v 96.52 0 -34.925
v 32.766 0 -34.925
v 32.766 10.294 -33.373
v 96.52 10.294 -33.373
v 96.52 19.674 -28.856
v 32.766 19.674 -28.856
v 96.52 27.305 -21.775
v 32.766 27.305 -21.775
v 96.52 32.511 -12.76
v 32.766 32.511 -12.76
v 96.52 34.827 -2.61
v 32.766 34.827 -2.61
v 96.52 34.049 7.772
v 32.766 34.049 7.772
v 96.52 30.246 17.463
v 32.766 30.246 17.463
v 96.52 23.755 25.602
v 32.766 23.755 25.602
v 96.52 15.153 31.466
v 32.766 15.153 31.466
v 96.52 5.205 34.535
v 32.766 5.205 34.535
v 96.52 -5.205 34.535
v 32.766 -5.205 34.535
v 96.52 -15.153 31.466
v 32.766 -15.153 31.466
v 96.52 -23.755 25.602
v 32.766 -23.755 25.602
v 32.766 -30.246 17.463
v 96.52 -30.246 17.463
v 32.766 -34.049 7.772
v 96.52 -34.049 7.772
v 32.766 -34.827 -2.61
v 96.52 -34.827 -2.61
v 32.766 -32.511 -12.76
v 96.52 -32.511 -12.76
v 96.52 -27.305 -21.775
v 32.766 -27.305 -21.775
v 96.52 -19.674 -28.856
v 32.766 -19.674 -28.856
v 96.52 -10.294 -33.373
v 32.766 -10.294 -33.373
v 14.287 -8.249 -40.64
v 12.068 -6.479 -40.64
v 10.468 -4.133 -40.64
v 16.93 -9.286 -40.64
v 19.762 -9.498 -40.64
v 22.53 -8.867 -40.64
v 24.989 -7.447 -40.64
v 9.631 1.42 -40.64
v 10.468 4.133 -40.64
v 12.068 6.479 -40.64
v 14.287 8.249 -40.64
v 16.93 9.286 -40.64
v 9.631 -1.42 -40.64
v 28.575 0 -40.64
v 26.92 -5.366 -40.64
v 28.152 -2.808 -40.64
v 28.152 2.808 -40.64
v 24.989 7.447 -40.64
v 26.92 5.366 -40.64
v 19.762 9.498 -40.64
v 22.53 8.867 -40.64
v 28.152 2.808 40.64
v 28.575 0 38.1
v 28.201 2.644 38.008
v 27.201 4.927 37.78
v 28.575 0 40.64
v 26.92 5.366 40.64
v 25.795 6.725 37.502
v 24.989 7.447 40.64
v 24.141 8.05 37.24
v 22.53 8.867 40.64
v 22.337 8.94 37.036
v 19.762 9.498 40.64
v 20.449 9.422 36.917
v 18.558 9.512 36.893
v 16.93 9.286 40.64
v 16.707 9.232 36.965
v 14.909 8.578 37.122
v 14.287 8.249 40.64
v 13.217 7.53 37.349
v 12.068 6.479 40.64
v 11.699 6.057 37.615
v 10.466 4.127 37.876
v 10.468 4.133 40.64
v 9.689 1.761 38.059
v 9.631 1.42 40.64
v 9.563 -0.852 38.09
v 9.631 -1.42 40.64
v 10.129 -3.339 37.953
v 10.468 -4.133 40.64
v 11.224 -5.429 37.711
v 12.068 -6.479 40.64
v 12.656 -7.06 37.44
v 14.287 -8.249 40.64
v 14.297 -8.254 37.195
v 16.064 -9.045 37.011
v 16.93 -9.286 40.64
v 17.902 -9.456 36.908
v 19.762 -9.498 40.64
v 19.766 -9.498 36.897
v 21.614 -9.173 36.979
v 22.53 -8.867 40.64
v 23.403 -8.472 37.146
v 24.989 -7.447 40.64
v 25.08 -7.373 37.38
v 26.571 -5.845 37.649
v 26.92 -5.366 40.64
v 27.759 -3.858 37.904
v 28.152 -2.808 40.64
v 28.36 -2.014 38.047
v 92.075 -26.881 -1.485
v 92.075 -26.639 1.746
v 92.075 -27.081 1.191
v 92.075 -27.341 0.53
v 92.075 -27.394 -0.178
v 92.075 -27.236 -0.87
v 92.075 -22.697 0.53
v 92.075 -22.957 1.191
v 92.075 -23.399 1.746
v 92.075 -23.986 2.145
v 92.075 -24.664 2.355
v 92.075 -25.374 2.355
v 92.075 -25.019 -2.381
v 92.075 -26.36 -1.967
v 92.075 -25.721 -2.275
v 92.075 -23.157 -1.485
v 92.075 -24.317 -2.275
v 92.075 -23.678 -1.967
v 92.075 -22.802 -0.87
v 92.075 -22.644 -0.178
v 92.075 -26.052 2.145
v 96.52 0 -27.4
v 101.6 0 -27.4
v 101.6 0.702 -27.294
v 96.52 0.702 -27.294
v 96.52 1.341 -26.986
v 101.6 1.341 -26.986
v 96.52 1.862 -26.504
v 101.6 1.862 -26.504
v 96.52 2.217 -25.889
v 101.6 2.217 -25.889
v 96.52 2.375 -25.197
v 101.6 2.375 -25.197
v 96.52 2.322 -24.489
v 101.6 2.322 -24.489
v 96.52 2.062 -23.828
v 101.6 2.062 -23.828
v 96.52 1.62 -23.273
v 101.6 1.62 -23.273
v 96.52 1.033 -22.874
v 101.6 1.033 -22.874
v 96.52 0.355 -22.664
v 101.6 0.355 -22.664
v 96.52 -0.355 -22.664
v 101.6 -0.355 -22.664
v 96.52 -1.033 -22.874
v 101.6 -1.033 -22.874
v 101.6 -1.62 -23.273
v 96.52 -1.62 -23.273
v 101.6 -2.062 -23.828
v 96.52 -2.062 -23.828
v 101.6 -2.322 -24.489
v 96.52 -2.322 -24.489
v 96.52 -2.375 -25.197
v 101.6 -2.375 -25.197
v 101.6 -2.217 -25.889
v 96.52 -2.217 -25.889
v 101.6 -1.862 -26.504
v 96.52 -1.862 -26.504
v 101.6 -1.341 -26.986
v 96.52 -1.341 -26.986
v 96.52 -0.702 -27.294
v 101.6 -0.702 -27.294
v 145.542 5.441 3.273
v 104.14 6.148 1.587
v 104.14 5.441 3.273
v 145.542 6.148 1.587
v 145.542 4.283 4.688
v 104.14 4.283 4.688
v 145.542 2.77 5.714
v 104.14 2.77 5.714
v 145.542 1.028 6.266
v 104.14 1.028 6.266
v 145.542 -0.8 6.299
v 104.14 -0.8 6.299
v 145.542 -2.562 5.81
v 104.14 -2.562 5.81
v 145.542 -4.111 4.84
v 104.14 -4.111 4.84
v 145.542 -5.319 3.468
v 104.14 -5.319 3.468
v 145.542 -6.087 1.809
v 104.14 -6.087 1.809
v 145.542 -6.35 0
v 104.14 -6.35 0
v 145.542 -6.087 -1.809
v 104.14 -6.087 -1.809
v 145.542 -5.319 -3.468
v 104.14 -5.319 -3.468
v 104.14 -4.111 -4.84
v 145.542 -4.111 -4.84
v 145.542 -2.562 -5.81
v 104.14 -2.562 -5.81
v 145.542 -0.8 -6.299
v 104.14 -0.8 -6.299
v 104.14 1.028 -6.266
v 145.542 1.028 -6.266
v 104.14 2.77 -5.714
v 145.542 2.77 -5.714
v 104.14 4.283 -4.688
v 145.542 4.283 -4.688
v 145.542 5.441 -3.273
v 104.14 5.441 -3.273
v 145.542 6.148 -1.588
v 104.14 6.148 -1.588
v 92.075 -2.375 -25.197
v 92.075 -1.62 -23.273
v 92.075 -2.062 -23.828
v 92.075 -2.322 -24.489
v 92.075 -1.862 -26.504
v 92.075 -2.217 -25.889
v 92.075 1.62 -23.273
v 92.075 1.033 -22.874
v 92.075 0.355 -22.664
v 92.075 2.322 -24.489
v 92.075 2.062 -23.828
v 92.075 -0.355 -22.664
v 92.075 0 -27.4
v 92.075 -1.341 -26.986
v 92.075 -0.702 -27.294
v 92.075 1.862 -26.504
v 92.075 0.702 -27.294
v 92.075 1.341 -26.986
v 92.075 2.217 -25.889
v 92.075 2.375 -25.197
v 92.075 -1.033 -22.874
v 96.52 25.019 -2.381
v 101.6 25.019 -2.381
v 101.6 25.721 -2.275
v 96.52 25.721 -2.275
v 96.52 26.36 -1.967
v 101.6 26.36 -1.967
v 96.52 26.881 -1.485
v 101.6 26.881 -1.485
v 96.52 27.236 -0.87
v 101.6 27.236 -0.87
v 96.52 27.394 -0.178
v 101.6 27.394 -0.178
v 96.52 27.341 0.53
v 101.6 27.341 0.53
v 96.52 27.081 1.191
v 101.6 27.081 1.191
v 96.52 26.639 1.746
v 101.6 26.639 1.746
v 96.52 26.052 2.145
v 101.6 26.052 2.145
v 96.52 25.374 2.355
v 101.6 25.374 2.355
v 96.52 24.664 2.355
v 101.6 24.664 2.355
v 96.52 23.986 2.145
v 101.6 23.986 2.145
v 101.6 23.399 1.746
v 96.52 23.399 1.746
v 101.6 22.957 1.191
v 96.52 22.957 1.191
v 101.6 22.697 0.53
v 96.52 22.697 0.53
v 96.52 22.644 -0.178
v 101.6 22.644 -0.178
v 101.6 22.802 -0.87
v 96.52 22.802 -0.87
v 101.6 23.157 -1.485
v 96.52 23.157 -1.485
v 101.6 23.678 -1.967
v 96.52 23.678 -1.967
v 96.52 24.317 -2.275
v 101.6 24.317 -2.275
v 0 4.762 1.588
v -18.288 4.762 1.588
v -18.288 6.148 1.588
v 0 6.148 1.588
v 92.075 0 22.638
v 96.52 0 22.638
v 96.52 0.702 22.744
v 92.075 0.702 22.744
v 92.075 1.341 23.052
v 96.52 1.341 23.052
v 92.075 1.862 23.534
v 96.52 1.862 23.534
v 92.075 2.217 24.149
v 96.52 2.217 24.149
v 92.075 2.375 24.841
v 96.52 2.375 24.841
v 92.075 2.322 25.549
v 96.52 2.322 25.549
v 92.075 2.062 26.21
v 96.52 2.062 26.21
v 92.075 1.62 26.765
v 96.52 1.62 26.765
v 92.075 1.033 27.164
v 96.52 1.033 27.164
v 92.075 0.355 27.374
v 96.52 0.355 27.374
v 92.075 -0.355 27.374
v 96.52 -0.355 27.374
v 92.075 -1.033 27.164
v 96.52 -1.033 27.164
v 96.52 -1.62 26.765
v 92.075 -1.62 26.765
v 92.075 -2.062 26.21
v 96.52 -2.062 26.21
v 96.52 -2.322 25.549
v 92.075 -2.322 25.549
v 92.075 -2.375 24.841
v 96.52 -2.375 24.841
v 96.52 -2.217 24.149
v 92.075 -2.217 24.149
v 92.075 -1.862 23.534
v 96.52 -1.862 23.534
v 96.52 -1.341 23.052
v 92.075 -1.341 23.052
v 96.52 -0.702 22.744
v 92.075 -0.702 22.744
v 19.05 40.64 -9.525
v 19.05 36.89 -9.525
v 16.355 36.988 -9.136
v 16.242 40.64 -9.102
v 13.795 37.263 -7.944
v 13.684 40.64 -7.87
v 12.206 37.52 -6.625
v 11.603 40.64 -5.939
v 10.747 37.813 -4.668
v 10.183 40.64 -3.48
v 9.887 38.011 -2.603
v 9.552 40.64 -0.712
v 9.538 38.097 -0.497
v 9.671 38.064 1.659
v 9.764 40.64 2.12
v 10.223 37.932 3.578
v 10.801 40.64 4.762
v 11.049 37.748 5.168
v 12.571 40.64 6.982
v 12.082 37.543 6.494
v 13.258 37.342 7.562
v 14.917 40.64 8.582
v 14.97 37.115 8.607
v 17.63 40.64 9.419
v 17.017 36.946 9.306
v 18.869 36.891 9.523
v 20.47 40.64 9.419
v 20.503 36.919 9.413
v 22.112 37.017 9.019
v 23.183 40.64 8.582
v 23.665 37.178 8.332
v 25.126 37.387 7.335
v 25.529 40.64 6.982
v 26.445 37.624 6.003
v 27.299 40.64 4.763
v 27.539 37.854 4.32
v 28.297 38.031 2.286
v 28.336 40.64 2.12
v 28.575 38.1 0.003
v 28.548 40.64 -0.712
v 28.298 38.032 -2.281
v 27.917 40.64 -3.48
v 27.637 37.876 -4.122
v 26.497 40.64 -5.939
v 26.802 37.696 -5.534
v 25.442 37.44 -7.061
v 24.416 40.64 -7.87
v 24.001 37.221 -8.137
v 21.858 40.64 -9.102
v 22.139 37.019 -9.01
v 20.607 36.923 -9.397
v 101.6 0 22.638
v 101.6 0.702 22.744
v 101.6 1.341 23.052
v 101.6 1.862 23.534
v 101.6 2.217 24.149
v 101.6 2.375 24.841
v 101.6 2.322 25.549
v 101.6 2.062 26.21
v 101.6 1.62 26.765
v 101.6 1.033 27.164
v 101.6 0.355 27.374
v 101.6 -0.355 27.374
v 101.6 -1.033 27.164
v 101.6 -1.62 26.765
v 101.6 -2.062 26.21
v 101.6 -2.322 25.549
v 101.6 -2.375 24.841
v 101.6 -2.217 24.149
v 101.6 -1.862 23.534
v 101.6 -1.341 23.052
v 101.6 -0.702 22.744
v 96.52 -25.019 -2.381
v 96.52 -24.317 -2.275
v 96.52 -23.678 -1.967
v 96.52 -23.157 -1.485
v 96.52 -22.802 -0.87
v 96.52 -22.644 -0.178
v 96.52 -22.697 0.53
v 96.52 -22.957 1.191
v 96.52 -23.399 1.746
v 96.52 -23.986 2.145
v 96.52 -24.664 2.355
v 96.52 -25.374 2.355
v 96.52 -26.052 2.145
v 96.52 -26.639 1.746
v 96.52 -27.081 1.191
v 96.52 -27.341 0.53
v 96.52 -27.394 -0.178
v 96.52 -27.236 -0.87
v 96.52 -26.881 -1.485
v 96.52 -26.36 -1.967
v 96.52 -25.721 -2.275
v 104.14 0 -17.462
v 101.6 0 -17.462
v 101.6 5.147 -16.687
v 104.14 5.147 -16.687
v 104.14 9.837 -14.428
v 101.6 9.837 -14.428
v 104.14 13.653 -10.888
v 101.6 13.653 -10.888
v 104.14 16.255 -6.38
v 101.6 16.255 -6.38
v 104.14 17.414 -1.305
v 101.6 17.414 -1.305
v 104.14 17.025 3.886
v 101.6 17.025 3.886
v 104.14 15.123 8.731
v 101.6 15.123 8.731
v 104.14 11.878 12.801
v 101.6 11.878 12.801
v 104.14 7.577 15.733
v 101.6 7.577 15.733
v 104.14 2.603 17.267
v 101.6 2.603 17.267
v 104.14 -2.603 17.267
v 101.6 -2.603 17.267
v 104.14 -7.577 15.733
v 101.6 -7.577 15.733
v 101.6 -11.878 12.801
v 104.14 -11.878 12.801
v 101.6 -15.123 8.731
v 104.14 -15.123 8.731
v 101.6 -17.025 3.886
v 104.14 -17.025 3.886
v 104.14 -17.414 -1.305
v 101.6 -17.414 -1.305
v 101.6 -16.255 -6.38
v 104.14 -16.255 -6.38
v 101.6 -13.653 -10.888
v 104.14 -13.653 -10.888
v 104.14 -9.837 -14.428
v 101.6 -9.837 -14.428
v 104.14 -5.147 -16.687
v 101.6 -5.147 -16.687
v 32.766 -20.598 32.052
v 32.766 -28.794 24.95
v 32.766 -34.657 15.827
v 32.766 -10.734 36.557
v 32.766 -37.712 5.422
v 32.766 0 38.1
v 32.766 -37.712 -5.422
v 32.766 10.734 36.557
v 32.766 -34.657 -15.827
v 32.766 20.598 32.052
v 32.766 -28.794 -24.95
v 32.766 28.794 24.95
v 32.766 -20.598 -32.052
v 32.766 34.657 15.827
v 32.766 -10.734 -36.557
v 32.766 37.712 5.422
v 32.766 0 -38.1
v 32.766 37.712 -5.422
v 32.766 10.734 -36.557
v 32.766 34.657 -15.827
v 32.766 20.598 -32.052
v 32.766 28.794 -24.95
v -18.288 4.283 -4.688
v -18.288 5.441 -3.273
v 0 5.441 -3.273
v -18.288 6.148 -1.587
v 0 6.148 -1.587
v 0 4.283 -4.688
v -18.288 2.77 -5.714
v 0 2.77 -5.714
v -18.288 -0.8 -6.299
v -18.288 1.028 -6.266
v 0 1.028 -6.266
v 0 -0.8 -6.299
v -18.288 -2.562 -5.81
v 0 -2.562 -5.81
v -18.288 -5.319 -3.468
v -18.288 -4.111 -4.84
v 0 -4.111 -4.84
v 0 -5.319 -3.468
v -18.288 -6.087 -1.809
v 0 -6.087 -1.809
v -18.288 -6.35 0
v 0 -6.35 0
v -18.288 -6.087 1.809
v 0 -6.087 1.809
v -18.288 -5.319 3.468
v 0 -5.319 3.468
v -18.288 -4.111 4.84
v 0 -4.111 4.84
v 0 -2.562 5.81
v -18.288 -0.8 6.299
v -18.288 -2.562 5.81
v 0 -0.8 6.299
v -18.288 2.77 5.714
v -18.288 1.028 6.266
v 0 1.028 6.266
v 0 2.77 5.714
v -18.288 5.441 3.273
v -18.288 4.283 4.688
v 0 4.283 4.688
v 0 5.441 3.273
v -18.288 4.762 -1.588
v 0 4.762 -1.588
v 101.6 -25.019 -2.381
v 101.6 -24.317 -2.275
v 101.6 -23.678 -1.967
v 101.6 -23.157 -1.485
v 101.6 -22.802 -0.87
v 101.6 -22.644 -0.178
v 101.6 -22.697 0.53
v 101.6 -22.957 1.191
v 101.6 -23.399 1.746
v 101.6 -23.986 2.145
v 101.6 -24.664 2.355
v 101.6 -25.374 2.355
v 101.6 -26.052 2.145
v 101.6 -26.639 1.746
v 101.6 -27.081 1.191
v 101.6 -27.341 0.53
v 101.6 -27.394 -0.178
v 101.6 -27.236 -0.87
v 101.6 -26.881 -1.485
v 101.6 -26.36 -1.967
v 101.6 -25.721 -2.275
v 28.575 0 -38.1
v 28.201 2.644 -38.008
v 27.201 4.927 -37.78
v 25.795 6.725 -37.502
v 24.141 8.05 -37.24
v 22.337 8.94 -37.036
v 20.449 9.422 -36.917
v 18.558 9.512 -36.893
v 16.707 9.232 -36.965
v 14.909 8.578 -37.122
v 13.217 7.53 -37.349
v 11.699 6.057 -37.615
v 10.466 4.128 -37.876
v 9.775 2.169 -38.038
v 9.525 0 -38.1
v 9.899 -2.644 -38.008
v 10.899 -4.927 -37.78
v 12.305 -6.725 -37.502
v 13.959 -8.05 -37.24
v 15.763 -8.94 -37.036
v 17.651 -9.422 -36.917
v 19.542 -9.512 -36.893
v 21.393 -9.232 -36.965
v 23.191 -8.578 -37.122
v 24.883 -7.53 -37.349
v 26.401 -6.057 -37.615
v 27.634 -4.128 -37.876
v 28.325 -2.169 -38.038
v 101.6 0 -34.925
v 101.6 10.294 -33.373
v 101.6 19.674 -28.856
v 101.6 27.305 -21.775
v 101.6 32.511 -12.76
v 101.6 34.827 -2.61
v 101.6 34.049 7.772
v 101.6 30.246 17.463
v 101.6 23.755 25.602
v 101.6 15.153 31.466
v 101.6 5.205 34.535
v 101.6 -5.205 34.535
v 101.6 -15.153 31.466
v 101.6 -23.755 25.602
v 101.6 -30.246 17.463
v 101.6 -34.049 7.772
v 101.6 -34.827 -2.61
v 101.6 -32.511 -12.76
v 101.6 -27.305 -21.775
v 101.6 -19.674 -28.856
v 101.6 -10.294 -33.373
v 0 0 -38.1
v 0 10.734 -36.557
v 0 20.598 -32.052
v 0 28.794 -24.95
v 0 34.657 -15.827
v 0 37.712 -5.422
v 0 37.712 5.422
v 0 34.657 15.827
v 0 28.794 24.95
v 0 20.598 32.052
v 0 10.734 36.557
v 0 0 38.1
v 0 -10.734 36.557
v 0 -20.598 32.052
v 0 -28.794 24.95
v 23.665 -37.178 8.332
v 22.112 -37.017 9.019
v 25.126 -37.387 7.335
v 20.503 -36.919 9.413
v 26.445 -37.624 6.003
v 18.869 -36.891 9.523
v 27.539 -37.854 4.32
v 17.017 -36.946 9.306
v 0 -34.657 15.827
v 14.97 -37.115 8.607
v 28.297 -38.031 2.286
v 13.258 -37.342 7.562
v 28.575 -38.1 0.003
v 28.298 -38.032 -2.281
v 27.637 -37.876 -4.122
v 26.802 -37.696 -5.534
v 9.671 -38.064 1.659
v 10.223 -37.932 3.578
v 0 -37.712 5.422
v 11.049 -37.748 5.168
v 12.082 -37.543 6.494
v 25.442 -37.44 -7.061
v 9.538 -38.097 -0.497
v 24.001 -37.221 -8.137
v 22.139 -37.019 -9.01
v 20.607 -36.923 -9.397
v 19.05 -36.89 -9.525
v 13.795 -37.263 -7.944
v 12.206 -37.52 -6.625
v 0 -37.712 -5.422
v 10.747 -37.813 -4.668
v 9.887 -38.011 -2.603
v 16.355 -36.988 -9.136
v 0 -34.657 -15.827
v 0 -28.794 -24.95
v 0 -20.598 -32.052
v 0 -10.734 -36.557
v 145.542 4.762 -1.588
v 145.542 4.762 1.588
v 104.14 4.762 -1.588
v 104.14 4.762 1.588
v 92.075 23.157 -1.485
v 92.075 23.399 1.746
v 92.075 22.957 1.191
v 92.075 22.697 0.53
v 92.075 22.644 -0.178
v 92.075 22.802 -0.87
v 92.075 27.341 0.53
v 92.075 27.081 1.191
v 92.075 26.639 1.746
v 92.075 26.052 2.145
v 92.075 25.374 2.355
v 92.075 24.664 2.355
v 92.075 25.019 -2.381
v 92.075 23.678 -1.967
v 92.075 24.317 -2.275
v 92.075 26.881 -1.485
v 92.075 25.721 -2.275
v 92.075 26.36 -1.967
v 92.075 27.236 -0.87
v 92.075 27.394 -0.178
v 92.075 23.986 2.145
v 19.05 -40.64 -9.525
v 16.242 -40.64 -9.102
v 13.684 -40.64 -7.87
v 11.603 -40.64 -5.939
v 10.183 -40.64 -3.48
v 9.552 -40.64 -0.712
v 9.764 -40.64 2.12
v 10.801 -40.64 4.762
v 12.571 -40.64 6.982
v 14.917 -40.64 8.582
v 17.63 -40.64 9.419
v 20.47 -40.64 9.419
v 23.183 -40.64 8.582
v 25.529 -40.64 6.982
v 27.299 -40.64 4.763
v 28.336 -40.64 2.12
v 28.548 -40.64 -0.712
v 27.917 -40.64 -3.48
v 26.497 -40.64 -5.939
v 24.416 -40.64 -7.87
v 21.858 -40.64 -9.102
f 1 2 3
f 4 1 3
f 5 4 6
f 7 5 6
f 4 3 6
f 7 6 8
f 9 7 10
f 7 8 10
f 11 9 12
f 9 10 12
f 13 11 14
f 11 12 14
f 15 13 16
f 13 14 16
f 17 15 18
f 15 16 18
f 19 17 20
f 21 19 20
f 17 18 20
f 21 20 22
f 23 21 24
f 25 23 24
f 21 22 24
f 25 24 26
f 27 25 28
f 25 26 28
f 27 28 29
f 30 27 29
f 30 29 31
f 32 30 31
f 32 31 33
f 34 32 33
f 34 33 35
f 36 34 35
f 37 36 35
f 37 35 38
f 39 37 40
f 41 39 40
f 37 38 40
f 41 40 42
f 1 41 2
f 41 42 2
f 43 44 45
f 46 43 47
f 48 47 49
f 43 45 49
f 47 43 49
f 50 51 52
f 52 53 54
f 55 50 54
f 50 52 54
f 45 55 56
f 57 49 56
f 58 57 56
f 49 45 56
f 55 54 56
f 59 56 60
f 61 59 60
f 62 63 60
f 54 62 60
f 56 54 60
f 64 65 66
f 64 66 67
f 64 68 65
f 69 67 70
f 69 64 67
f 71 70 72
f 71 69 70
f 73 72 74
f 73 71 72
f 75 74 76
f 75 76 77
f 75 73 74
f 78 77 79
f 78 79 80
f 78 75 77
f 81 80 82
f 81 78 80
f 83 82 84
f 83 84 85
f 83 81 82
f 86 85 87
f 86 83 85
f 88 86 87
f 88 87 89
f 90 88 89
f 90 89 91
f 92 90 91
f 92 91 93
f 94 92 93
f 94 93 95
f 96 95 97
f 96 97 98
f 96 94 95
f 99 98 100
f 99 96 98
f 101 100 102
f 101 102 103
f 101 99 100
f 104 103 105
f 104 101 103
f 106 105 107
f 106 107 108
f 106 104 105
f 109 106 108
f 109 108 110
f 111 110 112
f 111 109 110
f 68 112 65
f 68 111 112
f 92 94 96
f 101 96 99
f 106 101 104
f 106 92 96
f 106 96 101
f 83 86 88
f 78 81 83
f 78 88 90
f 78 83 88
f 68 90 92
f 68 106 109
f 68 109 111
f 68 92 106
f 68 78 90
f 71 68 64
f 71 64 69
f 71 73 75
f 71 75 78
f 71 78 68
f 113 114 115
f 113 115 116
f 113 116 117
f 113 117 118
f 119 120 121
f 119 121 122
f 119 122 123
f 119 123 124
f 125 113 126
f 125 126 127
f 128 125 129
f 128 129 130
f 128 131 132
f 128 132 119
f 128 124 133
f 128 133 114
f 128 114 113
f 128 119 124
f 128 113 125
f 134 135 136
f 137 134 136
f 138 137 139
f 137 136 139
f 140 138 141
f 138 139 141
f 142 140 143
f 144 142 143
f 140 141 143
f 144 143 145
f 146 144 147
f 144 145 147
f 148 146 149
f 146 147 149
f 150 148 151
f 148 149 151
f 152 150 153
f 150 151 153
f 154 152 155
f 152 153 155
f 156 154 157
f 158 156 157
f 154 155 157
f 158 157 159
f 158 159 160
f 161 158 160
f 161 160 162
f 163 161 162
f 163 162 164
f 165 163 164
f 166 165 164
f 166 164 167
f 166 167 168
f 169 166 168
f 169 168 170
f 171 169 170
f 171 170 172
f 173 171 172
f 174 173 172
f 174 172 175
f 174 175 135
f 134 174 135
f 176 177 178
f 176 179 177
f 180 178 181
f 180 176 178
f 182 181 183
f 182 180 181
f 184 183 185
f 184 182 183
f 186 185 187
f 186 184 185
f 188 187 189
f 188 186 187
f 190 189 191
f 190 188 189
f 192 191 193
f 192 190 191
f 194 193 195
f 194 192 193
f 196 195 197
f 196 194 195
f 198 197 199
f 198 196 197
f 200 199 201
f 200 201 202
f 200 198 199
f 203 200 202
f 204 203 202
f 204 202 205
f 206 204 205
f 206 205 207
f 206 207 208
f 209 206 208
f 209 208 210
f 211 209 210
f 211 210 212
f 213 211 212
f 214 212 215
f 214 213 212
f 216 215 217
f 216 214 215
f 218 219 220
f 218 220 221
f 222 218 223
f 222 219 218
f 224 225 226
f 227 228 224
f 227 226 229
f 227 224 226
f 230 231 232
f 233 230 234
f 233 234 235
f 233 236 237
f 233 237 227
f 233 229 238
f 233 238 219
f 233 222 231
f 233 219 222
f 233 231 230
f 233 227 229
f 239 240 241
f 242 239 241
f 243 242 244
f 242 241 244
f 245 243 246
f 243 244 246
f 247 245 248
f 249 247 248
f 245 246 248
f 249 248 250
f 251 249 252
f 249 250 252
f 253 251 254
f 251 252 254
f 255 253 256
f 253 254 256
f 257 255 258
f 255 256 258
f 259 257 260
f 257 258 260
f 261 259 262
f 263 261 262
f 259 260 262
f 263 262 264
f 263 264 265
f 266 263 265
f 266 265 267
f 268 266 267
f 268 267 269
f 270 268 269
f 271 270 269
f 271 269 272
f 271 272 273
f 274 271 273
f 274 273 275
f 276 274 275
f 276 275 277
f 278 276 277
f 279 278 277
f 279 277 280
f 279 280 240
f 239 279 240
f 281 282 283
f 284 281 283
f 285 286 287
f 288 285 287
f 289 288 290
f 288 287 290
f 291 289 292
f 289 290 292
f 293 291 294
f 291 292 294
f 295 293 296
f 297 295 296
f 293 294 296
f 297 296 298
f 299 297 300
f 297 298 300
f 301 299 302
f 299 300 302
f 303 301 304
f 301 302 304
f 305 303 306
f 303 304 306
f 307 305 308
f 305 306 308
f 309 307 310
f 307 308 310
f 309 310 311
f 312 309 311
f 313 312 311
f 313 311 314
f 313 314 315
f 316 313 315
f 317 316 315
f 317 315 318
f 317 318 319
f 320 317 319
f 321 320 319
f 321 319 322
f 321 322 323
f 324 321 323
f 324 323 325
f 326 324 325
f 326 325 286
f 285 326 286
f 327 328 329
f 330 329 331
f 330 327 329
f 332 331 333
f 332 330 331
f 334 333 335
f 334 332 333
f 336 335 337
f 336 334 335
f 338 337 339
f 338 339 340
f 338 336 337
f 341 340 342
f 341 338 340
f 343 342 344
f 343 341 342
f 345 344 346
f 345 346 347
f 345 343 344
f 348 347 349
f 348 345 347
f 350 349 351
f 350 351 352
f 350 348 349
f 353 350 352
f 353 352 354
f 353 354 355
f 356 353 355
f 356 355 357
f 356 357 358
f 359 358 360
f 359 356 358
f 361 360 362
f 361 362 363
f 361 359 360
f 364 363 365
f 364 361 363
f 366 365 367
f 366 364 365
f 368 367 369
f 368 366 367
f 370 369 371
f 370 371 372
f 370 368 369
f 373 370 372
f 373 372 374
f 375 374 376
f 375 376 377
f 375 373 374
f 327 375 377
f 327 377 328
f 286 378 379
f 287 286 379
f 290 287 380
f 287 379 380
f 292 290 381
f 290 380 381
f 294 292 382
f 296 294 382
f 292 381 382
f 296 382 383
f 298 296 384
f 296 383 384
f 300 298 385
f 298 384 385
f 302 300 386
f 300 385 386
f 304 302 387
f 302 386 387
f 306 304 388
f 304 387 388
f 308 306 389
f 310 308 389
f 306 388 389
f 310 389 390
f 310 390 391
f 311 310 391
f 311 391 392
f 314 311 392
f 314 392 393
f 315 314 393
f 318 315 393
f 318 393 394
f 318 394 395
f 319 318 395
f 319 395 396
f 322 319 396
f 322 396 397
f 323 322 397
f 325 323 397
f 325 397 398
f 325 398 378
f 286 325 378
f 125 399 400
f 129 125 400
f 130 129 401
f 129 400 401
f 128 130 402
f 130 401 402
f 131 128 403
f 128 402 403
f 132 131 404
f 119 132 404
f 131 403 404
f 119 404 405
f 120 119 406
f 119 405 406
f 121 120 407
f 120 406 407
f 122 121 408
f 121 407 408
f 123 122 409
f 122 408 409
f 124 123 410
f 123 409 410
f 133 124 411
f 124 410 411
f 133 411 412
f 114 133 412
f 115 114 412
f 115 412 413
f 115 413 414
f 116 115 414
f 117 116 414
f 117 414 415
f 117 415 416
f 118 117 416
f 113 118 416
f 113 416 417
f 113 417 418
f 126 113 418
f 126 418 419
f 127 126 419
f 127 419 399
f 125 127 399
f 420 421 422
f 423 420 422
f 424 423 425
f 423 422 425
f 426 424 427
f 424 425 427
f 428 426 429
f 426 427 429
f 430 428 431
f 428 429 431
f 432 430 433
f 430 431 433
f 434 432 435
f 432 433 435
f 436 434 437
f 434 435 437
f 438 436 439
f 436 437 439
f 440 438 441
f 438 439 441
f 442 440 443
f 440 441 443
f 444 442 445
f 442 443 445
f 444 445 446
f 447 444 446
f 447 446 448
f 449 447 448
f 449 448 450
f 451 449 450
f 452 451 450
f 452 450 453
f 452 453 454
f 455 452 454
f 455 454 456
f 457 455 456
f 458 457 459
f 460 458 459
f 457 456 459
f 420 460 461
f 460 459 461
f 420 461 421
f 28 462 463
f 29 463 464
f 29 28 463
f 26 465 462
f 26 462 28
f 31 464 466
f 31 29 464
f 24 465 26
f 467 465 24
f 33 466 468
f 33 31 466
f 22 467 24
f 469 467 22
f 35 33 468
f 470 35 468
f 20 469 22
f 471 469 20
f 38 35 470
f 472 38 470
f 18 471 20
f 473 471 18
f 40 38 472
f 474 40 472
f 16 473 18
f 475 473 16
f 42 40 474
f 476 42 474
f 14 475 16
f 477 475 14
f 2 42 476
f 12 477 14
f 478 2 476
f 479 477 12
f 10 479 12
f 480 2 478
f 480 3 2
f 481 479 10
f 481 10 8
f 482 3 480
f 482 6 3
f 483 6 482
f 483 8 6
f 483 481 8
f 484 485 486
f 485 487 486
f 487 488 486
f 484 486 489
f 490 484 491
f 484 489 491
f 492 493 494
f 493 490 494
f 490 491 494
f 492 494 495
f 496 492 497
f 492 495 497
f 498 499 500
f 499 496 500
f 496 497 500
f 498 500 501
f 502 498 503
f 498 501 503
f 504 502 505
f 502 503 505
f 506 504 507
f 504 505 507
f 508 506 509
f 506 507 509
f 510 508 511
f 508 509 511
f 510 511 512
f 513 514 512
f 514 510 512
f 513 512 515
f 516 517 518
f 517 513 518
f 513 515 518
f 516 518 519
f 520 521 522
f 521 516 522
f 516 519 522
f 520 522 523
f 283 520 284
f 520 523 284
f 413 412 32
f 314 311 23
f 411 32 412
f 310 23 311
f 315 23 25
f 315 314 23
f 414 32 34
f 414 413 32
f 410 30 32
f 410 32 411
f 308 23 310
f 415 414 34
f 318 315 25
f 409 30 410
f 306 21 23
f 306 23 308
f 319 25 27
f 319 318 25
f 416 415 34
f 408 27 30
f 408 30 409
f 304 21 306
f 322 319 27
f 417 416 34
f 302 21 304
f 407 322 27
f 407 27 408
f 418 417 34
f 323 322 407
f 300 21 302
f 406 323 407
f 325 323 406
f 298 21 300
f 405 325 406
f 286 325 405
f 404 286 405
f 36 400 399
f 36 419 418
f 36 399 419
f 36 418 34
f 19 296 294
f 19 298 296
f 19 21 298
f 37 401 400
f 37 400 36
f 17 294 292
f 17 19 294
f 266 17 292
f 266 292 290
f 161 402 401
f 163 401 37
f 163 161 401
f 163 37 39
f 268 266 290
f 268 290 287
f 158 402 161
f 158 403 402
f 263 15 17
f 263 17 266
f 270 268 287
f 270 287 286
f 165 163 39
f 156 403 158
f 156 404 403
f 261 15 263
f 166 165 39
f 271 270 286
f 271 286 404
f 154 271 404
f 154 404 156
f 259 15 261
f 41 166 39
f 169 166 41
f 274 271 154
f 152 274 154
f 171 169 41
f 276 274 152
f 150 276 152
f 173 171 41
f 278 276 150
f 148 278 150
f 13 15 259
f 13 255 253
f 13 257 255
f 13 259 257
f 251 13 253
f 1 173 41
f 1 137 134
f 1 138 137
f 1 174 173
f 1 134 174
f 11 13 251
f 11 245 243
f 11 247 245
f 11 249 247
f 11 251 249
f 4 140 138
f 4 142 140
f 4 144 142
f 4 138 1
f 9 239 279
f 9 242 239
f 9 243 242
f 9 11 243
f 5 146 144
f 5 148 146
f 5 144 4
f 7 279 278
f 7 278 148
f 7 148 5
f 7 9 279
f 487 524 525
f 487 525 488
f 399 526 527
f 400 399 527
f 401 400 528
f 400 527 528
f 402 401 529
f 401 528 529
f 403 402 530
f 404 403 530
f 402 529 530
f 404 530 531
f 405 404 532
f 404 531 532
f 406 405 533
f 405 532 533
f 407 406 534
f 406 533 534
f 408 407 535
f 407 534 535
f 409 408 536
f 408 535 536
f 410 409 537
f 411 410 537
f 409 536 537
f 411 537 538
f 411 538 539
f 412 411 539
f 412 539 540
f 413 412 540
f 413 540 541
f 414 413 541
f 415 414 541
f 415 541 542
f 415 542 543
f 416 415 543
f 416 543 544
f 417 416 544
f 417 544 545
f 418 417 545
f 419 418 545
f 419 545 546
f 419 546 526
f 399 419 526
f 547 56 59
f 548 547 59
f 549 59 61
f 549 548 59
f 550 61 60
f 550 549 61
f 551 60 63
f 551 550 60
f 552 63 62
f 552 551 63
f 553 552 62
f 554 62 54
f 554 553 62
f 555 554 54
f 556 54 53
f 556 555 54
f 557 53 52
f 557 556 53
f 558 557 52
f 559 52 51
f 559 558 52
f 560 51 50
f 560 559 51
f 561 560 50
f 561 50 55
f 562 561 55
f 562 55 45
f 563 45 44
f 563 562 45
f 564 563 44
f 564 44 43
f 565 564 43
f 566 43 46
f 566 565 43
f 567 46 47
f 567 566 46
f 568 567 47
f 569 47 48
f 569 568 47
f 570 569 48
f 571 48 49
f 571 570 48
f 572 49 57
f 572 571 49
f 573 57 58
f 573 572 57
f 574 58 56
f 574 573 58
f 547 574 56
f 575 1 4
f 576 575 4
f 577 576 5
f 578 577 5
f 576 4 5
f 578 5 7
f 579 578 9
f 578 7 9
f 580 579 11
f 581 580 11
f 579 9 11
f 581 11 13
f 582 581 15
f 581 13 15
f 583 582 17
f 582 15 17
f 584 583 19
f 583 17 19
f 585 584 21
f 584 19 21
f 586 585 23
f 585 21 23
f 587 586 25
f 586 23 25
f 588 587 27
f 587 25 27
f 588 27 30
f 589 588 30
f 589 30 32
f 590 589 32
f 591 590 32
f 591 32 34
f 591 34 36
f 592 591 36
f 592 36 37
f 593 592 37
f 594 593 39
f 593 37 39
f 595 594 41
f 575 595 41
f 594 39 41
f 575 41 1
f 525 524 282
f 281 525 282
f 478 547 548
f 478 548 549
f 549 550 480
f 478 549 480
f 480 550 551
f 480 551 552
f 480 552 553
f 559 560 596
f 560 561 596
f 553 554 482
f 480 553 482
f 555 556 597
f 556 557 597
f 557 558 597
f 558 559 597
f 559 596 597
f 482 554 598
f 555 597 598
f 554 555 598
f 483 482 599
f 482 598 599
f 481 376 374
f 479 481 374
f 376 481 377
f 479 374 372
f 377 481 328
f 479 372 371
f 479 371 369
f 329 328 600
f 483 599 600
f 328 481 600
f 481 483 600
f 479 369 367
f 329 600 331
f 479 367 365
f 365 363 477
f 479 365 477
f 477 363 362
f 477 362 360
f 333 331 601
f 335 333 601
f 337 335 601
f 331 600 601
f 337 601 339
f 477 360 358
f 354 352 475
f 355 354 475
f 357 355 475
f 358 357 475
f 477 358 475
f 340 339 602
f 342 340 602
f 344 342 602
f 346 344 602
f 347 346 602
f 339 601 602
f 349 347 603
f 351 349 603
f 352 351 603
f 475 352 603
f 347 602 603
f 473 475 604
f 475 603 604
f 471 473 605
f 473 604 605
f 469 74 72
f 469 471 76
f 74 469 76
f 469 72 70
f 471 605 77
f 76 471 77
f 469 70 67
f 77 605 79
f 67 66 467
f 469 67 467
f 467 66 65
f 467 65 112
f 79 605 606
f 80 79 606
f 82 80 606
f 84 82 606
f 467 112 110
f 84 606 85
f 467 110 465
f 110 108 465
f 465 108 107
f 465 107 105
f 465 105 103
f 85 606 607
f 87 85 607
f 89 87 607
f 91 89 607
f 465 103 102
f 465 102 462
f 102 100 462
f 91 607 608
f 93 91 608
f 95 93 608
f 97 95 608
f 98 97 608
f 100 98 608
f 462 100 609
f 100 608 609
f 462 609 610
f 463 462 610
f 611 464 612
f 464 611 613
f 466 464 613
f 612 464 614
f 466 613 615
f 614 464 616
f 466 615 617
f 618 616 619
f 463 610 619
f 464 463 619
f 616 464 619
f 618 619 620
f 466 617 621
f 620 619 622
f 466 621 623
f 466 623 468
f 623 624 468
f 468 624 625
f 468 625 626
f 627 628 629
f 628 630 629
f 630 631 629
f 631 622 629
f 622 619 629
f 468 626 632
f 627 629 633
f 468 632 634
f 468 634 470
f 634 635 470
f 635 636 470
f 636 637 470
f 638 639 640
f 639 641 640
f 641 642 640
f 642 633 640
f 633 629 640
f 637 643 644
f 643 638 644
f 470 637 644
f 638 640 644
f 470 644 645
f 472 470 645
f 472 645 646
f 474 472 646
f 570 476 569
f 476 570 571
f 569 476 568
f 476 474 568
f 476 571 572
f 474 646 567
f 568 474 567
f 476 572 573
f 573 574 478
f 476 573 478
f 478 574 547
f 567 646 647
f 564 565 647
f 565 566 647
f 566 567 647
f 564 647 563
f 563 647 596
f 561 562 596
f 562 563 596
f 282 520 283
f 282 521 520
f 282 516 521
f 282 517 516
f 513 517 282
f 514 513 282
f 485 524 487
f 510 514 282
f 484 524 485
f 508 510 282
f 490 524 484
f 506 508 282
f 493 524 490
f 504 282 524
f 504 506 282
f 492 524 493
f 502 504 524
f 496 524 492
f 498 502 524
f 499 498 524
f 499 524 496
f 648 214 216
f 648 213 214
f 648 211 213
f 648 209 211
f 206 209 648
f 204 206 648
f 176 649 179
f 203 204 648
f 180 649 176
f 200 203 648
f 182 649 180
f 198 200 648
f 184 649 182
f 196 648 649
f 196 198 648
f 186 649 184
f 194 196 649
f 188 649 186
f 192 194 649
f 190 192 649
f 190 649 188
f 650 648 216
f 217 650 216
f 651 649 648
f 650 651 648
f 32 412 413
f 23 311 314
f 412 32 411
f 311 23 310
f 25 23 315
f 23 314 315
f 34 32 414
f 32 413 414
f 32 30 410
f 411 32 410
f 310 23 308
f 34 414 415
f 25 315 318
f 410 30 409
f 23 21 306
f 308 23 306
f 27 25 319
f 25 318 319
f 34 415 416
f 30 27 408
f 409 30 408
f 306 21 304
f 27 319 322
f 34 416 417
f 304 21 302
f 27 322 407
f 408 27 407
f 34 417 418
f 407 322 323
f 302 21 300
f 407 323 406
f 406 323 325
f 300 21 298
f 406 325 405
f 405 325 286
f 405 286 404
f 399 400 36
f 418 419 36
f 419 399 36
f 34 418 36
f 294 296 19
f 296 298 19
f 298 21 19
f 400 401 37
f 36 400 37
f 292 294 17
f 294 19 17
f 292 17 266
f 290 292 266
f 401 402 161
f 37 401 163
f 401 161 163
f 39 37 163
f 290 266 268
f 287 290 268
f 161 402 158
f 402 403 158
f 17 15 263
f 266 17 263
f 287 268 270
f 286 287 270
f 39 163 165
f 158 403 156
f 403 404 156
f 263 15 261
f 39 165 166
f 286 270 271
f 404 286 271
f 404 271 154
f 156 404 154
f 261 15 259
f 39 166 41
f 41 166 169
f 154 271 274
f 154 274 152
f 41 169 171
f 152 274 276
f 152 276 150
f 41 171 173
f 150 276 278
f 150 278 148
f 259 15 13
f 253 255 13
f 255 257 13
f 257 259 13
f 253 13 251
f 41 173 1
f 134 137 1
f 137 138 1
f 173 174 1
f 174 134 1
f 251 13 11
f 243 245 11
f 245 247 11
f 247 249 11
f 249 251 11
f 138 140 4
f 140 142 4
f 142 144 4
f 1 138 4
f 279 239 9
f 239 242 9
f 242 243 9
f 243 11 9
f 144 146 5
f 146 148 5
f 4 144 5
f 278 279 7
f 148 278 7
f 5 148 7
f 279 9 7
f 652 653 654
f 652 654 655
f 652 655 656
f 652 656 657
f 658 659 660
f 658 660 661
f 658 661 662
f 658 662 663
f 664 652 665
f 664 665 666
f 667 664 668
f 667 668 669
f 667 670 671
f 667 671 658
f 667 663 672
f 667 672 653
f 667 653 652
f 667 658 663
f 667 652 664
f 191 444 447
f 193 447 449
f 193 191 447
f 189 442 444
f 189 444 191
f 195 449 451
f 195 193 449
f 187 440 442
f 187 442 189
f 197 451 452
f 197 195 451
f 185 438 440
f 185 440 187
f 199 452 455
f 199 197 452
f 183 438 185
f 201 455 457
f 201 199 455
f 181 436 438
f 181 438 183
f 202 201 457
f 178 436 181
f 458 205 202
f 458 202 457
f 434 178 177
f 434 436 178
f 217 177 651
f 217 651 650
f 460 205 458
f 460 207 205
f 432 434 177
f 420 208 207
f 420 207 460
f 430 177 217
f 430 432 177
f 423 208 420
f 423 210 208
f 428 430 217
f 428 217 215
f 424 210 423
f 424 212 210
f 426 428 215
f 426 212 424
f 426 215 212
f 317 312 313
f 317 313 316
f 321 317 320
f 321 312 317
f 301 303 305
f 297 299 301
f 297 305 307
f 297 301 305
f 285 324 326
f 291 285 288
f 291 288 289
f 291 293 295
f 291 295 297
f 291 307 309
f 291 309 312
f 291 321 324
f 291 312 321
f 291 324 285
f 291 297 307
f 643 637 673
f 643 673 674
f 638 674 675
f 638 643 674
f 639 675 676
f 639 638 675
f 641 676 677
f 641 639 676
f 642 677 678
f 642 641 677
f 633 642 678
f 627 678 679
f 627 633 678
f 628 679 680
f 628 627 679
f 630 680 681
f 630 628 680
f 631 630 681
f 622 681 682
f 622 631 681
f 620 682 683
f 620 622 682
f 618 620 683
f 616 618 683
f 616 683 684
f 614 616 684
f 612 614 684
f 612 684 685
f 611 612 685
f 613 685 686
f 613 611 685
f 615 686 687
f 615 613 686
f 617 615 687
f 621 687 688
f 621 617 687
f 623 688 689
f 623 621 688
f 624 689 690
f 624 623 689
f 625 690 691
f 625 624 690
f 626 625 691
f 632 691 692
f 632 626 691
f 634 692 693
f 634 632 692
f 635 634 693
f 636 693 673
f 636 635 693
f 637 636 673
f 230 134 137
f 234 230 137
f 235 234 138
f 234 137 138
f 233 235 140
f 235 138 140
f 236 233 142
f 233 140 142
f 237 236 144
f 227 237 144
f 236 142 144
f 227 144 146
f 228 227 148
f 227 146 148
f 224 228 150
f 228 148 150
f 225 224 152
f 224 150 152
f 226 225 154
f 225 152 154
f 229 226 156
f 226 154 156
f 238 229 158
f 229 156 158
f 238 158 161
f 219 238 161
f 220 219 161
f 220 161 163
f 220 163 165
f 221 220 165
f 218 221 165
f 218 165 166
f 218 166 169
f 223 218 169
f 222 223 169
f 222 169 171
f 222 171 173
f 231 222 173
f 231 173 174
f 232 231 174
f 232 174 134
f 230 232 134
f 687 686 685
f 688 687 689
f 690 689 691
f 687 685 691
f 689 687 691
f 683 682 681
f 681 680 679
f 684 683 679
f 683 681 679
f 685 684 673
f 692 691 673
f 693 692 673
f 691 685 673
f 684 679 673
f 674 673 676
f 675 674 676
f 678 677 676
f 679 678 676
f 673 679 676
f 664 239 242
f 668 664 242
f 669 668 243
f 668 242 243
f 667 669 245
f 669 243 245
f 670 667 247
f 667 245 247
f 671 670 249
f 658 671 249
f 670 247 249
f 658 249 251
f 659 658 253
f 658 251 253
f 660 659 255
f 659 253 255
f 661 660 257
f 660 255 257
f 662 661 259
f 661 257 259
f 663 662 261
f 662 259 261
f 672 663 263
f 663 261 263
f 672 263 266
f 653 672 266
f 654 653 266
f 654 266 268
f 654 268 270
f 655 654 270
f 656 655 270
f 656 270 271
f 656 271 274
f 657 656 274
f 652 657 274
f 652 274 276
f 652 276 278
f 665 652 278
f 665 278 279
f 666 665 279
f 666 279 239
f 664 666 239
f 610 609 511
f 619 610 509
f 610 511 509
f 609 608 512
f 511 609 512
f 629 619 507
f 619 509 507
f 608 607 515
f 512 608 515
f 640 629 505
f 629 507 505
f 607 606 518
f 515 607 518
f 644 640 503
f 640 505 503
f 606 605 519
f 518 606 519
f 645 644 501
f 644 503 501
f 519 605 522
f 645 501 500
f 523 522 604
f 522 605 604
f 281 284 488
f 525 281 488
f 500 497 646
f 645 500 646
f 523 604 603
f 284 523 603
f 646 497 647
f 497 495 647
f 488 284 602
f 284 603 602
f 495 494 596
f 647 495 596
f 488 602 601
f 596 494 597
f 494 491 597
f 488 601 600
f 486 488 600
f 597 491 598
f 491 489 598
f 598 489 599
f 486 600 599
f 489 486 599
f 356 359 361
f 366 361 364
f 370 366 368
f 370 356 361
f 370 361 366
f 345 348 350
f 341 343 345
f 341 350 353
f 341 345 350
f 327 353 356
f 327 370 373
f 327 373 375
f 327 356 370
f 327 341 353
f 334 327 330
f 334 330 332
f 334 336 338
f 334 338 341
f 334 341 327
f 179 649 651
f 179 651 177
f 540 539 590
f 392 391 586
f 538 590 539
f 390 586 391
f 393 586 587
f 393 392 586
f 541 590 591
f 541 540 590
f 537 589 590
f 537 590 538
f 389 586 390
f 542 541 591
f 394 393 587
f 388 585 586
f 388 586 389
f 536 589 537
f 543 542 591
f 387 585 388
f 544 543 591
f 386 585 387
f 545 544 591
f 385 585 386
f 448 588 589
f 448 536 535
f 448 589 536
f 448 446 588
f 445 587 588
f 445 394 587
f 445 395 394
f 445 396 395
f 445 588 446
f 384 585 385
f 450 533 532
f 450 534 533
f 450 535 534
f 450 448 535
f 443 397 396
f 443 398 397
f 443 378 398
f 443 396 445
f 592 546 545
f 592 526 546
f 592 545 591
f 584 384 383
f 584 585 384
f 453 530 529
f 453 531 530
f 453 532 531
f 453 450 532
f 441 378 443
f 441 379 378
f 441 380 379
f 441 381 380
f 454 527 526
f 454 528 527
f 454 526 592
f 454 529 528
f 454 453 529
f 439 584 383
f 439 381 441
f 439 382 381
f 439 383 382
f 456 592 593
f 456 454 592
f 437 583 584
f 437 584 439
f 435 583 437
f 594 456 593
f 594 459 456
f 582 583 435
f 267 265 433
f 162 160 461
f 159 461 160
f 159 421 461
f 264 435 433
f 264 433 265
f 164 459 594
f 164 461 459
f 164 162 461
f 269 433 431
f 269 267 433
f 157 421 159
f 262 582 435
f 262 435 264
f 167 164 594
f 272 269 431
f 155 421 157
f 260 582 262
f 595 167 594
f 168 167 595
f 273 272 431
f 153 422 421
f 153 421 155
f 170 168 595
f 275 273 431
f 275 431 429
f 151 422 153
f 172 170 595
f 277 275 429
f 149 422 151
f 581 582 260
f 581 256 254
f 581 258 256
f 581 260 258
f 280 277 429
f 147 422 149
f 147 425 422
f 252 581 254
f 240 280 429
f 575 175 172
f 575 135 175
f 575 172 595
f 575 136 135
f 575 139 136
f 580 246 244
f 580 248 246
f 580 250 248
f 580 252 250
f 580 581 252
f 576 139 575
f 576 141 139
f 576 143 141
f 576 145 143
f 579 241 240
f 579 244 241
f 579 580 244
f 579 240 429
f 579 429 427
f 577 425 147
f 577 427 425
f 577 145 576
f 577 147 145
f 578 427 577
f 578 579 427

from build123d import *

# Parameters (mm, degrees)
SKETCH1_R          = 38.1
EXTRUDE1_DEPTH     = 32.766
SKETCH5_R          = 6.35
EXTRUDE5_DEPTH     = 18.288
SKETCH2_R          = 34.925
EXTRUDE6_DEPTH     = 63.754
SKETCH6_R          = 34.925
EXTRUDE7_DEPTH     = 5.08
SKETCH7_R          = 17.4625
EXTRUDE8_DEPTH     = 2.54
EXTRUDE9_START     = 43.942
SKETCH8_R          = 6.35
EXTRUDE9_DEPTH     = 43.942
SKETCH9_W          = 3.175
SKETCH9_H          = 3.175
CUT_EXTRUDE1_DEPTH = 41.402
SKETCH10_W         = 3.175
SKETCH10_H         = 3.175
CUT_EXTRUDE2_DEPTH = 18.288
SKETCH11_R         = 9.525
EXTRUDE10_DEPTH    = 40.64
SKETCH12_R         = 9.525
EXTRUDE11_DEPTH    = 40.64
SKETCH13_R         = 2.38125
CUT_EXTRUDE3_DEPTH = 9.525


with BuildPart() as part:
    # Sketch1 → Extrude1 (new body)
    with BuildSketch(Plane(origin=(0, 0, 0), x_dir=(0, 0, -1), z_dir=(1, 0, 0))):
        Circle(SKETCH1_R)
    extrude(amount=EXTRUDE1_DEPTH)

    # Sketch5 → Extrude5 (add)
    with BuildSketch(Plane.ZY):
        with Locations(Location((0, 0, 0), (0, 0, 180))):
            Circle(SKETCH5_R)
    extrude(amount=EXTRUDE5_DEPTH)

    # Sketch2 → Extrude6 (add)
    with BuildSketch(Plane(origin=(32.766, 0, 0), x_dir=(0, 0, -1), z_dir=(1, 0, 0))):
        Circle(SKETCH2_R)
    extrude(amount=EXTRUDE6_DEPTH)

    # Sketch10 → Cut-Extrude2 (cut)
    with BuildSketch(Plane.ZY.offset(18.288)):
        with Locations((0, 6.35)):
            Rectangle(SKETCH10_W, SKETCH10_H)
    extrude(amount=-CUT_EXTRUDE2_DEPTH, mode=Mode.SUBTRACT)

    # Sketch11 → Extrude10 (add, symmetric)
    with BuildSketch(Plane(origin=(0, 0, 0), x_dir=(1, 0, 0), z_dir=(0, 1, 0))):
        with Locations(Location((19.05, 0, 0), (0, 0, 90))):
            Circle(SKETCH11_R)
    extrude(amount=EXTRUDE10_DEPTH, both=True)

    # Sketch12 → Extrude11 (add, symmetric)
    with BuildSketch(Plane.XY):
        with Locations((19.05, 0)):
            Circle(SKETCH12_R)
    extrude(amount=EXTRUDE11_DEPTH, both=True)


with BuildPart() as body_2:
    # Sketch6 → Extrude7 (new body)
    with BuildSketch(Plane(origin=(96.52, 0, 0), x_dir=(0, 0, -1), z_dir=(1, 0, 0))):
        Circle(SKETCH6_R)
    extrude(amount=EXTRUDE7_DEPTH)

    # Sketch7 → Extrude8 (add)
    with BuildSketch(Plane(origin=(101.6, 0, 0), x_dir=(0, 0, -1), z_dir=(1, 0, 0))):
        Circle(SKETCH7_R)
    extrude(amount=EXTRUDE8_DEPTH)

    # Sketch8 → Extrude9 (add)
    with BuildSketch(Plane(origin=(101.6, 0, 0), x_dir=(0, 0, -1), z_dir=(1, 0, 0)).offset(EXTRUDE9_START)):
        with Locations(Location((0, 0, 0), (0, 0, 180))):
            Circle(SKETCH8_R)
    extrude(amount=-EXTRUDE9_DEPTH)

    # Sketch9 → Cut-Extrude1 (cut)
    with BuildSketch(Plane(origin=(145.542, 0, 0), x_dir=(0, 0, -1), z_dir=(1, 0, 0))):
        with Locations((0, 6.35)):
            Rectangle(SKETCH9_W, SKETCH9_H)
    extrude(amount=-CUT_EXTRUDE1_DEPTH, mode=Mode.SUBTRACT)


with BuildPart() as cut_extrude3_tool:
    # Sketch13 → Cut-Extrude3 (new body)
    with BuildSketch(Plane(origin=(101.6, 0, 0), x_dir=(0, 0, -1), z_dir=(1, 0, 0))):
        with Locations((25.019, 0)):
            Circle(SKETCH13_R)
        with Locations((0, 25.019)):
            Circle(SKETCH13_R)
        with Locations((-25.019, 0)):
            Circle(SKETCH13_R)
        with Locations((0, -25.019)):
            Circle(SKETCH13_R)
    extrude(amount=-CUT_EXTRUDE3_DEPTH)


with BuildPart() as part_1:
    add(part.part)

    # Cut-Extrude3: cut by cut_extrude3_tool
    add(cut_extrude3_tool.part, mode=Mode.SUBTRACT)


with BuildPart() as body_2_1:
    add(body_2.part)

    # Cut-Extrude3: cut by cut_extrude3_tool
    add(cut_extrude3_tool.part, mode=Mode.SUBTRACT)


solid = Compound([part_1.part, body_2_1.part])
